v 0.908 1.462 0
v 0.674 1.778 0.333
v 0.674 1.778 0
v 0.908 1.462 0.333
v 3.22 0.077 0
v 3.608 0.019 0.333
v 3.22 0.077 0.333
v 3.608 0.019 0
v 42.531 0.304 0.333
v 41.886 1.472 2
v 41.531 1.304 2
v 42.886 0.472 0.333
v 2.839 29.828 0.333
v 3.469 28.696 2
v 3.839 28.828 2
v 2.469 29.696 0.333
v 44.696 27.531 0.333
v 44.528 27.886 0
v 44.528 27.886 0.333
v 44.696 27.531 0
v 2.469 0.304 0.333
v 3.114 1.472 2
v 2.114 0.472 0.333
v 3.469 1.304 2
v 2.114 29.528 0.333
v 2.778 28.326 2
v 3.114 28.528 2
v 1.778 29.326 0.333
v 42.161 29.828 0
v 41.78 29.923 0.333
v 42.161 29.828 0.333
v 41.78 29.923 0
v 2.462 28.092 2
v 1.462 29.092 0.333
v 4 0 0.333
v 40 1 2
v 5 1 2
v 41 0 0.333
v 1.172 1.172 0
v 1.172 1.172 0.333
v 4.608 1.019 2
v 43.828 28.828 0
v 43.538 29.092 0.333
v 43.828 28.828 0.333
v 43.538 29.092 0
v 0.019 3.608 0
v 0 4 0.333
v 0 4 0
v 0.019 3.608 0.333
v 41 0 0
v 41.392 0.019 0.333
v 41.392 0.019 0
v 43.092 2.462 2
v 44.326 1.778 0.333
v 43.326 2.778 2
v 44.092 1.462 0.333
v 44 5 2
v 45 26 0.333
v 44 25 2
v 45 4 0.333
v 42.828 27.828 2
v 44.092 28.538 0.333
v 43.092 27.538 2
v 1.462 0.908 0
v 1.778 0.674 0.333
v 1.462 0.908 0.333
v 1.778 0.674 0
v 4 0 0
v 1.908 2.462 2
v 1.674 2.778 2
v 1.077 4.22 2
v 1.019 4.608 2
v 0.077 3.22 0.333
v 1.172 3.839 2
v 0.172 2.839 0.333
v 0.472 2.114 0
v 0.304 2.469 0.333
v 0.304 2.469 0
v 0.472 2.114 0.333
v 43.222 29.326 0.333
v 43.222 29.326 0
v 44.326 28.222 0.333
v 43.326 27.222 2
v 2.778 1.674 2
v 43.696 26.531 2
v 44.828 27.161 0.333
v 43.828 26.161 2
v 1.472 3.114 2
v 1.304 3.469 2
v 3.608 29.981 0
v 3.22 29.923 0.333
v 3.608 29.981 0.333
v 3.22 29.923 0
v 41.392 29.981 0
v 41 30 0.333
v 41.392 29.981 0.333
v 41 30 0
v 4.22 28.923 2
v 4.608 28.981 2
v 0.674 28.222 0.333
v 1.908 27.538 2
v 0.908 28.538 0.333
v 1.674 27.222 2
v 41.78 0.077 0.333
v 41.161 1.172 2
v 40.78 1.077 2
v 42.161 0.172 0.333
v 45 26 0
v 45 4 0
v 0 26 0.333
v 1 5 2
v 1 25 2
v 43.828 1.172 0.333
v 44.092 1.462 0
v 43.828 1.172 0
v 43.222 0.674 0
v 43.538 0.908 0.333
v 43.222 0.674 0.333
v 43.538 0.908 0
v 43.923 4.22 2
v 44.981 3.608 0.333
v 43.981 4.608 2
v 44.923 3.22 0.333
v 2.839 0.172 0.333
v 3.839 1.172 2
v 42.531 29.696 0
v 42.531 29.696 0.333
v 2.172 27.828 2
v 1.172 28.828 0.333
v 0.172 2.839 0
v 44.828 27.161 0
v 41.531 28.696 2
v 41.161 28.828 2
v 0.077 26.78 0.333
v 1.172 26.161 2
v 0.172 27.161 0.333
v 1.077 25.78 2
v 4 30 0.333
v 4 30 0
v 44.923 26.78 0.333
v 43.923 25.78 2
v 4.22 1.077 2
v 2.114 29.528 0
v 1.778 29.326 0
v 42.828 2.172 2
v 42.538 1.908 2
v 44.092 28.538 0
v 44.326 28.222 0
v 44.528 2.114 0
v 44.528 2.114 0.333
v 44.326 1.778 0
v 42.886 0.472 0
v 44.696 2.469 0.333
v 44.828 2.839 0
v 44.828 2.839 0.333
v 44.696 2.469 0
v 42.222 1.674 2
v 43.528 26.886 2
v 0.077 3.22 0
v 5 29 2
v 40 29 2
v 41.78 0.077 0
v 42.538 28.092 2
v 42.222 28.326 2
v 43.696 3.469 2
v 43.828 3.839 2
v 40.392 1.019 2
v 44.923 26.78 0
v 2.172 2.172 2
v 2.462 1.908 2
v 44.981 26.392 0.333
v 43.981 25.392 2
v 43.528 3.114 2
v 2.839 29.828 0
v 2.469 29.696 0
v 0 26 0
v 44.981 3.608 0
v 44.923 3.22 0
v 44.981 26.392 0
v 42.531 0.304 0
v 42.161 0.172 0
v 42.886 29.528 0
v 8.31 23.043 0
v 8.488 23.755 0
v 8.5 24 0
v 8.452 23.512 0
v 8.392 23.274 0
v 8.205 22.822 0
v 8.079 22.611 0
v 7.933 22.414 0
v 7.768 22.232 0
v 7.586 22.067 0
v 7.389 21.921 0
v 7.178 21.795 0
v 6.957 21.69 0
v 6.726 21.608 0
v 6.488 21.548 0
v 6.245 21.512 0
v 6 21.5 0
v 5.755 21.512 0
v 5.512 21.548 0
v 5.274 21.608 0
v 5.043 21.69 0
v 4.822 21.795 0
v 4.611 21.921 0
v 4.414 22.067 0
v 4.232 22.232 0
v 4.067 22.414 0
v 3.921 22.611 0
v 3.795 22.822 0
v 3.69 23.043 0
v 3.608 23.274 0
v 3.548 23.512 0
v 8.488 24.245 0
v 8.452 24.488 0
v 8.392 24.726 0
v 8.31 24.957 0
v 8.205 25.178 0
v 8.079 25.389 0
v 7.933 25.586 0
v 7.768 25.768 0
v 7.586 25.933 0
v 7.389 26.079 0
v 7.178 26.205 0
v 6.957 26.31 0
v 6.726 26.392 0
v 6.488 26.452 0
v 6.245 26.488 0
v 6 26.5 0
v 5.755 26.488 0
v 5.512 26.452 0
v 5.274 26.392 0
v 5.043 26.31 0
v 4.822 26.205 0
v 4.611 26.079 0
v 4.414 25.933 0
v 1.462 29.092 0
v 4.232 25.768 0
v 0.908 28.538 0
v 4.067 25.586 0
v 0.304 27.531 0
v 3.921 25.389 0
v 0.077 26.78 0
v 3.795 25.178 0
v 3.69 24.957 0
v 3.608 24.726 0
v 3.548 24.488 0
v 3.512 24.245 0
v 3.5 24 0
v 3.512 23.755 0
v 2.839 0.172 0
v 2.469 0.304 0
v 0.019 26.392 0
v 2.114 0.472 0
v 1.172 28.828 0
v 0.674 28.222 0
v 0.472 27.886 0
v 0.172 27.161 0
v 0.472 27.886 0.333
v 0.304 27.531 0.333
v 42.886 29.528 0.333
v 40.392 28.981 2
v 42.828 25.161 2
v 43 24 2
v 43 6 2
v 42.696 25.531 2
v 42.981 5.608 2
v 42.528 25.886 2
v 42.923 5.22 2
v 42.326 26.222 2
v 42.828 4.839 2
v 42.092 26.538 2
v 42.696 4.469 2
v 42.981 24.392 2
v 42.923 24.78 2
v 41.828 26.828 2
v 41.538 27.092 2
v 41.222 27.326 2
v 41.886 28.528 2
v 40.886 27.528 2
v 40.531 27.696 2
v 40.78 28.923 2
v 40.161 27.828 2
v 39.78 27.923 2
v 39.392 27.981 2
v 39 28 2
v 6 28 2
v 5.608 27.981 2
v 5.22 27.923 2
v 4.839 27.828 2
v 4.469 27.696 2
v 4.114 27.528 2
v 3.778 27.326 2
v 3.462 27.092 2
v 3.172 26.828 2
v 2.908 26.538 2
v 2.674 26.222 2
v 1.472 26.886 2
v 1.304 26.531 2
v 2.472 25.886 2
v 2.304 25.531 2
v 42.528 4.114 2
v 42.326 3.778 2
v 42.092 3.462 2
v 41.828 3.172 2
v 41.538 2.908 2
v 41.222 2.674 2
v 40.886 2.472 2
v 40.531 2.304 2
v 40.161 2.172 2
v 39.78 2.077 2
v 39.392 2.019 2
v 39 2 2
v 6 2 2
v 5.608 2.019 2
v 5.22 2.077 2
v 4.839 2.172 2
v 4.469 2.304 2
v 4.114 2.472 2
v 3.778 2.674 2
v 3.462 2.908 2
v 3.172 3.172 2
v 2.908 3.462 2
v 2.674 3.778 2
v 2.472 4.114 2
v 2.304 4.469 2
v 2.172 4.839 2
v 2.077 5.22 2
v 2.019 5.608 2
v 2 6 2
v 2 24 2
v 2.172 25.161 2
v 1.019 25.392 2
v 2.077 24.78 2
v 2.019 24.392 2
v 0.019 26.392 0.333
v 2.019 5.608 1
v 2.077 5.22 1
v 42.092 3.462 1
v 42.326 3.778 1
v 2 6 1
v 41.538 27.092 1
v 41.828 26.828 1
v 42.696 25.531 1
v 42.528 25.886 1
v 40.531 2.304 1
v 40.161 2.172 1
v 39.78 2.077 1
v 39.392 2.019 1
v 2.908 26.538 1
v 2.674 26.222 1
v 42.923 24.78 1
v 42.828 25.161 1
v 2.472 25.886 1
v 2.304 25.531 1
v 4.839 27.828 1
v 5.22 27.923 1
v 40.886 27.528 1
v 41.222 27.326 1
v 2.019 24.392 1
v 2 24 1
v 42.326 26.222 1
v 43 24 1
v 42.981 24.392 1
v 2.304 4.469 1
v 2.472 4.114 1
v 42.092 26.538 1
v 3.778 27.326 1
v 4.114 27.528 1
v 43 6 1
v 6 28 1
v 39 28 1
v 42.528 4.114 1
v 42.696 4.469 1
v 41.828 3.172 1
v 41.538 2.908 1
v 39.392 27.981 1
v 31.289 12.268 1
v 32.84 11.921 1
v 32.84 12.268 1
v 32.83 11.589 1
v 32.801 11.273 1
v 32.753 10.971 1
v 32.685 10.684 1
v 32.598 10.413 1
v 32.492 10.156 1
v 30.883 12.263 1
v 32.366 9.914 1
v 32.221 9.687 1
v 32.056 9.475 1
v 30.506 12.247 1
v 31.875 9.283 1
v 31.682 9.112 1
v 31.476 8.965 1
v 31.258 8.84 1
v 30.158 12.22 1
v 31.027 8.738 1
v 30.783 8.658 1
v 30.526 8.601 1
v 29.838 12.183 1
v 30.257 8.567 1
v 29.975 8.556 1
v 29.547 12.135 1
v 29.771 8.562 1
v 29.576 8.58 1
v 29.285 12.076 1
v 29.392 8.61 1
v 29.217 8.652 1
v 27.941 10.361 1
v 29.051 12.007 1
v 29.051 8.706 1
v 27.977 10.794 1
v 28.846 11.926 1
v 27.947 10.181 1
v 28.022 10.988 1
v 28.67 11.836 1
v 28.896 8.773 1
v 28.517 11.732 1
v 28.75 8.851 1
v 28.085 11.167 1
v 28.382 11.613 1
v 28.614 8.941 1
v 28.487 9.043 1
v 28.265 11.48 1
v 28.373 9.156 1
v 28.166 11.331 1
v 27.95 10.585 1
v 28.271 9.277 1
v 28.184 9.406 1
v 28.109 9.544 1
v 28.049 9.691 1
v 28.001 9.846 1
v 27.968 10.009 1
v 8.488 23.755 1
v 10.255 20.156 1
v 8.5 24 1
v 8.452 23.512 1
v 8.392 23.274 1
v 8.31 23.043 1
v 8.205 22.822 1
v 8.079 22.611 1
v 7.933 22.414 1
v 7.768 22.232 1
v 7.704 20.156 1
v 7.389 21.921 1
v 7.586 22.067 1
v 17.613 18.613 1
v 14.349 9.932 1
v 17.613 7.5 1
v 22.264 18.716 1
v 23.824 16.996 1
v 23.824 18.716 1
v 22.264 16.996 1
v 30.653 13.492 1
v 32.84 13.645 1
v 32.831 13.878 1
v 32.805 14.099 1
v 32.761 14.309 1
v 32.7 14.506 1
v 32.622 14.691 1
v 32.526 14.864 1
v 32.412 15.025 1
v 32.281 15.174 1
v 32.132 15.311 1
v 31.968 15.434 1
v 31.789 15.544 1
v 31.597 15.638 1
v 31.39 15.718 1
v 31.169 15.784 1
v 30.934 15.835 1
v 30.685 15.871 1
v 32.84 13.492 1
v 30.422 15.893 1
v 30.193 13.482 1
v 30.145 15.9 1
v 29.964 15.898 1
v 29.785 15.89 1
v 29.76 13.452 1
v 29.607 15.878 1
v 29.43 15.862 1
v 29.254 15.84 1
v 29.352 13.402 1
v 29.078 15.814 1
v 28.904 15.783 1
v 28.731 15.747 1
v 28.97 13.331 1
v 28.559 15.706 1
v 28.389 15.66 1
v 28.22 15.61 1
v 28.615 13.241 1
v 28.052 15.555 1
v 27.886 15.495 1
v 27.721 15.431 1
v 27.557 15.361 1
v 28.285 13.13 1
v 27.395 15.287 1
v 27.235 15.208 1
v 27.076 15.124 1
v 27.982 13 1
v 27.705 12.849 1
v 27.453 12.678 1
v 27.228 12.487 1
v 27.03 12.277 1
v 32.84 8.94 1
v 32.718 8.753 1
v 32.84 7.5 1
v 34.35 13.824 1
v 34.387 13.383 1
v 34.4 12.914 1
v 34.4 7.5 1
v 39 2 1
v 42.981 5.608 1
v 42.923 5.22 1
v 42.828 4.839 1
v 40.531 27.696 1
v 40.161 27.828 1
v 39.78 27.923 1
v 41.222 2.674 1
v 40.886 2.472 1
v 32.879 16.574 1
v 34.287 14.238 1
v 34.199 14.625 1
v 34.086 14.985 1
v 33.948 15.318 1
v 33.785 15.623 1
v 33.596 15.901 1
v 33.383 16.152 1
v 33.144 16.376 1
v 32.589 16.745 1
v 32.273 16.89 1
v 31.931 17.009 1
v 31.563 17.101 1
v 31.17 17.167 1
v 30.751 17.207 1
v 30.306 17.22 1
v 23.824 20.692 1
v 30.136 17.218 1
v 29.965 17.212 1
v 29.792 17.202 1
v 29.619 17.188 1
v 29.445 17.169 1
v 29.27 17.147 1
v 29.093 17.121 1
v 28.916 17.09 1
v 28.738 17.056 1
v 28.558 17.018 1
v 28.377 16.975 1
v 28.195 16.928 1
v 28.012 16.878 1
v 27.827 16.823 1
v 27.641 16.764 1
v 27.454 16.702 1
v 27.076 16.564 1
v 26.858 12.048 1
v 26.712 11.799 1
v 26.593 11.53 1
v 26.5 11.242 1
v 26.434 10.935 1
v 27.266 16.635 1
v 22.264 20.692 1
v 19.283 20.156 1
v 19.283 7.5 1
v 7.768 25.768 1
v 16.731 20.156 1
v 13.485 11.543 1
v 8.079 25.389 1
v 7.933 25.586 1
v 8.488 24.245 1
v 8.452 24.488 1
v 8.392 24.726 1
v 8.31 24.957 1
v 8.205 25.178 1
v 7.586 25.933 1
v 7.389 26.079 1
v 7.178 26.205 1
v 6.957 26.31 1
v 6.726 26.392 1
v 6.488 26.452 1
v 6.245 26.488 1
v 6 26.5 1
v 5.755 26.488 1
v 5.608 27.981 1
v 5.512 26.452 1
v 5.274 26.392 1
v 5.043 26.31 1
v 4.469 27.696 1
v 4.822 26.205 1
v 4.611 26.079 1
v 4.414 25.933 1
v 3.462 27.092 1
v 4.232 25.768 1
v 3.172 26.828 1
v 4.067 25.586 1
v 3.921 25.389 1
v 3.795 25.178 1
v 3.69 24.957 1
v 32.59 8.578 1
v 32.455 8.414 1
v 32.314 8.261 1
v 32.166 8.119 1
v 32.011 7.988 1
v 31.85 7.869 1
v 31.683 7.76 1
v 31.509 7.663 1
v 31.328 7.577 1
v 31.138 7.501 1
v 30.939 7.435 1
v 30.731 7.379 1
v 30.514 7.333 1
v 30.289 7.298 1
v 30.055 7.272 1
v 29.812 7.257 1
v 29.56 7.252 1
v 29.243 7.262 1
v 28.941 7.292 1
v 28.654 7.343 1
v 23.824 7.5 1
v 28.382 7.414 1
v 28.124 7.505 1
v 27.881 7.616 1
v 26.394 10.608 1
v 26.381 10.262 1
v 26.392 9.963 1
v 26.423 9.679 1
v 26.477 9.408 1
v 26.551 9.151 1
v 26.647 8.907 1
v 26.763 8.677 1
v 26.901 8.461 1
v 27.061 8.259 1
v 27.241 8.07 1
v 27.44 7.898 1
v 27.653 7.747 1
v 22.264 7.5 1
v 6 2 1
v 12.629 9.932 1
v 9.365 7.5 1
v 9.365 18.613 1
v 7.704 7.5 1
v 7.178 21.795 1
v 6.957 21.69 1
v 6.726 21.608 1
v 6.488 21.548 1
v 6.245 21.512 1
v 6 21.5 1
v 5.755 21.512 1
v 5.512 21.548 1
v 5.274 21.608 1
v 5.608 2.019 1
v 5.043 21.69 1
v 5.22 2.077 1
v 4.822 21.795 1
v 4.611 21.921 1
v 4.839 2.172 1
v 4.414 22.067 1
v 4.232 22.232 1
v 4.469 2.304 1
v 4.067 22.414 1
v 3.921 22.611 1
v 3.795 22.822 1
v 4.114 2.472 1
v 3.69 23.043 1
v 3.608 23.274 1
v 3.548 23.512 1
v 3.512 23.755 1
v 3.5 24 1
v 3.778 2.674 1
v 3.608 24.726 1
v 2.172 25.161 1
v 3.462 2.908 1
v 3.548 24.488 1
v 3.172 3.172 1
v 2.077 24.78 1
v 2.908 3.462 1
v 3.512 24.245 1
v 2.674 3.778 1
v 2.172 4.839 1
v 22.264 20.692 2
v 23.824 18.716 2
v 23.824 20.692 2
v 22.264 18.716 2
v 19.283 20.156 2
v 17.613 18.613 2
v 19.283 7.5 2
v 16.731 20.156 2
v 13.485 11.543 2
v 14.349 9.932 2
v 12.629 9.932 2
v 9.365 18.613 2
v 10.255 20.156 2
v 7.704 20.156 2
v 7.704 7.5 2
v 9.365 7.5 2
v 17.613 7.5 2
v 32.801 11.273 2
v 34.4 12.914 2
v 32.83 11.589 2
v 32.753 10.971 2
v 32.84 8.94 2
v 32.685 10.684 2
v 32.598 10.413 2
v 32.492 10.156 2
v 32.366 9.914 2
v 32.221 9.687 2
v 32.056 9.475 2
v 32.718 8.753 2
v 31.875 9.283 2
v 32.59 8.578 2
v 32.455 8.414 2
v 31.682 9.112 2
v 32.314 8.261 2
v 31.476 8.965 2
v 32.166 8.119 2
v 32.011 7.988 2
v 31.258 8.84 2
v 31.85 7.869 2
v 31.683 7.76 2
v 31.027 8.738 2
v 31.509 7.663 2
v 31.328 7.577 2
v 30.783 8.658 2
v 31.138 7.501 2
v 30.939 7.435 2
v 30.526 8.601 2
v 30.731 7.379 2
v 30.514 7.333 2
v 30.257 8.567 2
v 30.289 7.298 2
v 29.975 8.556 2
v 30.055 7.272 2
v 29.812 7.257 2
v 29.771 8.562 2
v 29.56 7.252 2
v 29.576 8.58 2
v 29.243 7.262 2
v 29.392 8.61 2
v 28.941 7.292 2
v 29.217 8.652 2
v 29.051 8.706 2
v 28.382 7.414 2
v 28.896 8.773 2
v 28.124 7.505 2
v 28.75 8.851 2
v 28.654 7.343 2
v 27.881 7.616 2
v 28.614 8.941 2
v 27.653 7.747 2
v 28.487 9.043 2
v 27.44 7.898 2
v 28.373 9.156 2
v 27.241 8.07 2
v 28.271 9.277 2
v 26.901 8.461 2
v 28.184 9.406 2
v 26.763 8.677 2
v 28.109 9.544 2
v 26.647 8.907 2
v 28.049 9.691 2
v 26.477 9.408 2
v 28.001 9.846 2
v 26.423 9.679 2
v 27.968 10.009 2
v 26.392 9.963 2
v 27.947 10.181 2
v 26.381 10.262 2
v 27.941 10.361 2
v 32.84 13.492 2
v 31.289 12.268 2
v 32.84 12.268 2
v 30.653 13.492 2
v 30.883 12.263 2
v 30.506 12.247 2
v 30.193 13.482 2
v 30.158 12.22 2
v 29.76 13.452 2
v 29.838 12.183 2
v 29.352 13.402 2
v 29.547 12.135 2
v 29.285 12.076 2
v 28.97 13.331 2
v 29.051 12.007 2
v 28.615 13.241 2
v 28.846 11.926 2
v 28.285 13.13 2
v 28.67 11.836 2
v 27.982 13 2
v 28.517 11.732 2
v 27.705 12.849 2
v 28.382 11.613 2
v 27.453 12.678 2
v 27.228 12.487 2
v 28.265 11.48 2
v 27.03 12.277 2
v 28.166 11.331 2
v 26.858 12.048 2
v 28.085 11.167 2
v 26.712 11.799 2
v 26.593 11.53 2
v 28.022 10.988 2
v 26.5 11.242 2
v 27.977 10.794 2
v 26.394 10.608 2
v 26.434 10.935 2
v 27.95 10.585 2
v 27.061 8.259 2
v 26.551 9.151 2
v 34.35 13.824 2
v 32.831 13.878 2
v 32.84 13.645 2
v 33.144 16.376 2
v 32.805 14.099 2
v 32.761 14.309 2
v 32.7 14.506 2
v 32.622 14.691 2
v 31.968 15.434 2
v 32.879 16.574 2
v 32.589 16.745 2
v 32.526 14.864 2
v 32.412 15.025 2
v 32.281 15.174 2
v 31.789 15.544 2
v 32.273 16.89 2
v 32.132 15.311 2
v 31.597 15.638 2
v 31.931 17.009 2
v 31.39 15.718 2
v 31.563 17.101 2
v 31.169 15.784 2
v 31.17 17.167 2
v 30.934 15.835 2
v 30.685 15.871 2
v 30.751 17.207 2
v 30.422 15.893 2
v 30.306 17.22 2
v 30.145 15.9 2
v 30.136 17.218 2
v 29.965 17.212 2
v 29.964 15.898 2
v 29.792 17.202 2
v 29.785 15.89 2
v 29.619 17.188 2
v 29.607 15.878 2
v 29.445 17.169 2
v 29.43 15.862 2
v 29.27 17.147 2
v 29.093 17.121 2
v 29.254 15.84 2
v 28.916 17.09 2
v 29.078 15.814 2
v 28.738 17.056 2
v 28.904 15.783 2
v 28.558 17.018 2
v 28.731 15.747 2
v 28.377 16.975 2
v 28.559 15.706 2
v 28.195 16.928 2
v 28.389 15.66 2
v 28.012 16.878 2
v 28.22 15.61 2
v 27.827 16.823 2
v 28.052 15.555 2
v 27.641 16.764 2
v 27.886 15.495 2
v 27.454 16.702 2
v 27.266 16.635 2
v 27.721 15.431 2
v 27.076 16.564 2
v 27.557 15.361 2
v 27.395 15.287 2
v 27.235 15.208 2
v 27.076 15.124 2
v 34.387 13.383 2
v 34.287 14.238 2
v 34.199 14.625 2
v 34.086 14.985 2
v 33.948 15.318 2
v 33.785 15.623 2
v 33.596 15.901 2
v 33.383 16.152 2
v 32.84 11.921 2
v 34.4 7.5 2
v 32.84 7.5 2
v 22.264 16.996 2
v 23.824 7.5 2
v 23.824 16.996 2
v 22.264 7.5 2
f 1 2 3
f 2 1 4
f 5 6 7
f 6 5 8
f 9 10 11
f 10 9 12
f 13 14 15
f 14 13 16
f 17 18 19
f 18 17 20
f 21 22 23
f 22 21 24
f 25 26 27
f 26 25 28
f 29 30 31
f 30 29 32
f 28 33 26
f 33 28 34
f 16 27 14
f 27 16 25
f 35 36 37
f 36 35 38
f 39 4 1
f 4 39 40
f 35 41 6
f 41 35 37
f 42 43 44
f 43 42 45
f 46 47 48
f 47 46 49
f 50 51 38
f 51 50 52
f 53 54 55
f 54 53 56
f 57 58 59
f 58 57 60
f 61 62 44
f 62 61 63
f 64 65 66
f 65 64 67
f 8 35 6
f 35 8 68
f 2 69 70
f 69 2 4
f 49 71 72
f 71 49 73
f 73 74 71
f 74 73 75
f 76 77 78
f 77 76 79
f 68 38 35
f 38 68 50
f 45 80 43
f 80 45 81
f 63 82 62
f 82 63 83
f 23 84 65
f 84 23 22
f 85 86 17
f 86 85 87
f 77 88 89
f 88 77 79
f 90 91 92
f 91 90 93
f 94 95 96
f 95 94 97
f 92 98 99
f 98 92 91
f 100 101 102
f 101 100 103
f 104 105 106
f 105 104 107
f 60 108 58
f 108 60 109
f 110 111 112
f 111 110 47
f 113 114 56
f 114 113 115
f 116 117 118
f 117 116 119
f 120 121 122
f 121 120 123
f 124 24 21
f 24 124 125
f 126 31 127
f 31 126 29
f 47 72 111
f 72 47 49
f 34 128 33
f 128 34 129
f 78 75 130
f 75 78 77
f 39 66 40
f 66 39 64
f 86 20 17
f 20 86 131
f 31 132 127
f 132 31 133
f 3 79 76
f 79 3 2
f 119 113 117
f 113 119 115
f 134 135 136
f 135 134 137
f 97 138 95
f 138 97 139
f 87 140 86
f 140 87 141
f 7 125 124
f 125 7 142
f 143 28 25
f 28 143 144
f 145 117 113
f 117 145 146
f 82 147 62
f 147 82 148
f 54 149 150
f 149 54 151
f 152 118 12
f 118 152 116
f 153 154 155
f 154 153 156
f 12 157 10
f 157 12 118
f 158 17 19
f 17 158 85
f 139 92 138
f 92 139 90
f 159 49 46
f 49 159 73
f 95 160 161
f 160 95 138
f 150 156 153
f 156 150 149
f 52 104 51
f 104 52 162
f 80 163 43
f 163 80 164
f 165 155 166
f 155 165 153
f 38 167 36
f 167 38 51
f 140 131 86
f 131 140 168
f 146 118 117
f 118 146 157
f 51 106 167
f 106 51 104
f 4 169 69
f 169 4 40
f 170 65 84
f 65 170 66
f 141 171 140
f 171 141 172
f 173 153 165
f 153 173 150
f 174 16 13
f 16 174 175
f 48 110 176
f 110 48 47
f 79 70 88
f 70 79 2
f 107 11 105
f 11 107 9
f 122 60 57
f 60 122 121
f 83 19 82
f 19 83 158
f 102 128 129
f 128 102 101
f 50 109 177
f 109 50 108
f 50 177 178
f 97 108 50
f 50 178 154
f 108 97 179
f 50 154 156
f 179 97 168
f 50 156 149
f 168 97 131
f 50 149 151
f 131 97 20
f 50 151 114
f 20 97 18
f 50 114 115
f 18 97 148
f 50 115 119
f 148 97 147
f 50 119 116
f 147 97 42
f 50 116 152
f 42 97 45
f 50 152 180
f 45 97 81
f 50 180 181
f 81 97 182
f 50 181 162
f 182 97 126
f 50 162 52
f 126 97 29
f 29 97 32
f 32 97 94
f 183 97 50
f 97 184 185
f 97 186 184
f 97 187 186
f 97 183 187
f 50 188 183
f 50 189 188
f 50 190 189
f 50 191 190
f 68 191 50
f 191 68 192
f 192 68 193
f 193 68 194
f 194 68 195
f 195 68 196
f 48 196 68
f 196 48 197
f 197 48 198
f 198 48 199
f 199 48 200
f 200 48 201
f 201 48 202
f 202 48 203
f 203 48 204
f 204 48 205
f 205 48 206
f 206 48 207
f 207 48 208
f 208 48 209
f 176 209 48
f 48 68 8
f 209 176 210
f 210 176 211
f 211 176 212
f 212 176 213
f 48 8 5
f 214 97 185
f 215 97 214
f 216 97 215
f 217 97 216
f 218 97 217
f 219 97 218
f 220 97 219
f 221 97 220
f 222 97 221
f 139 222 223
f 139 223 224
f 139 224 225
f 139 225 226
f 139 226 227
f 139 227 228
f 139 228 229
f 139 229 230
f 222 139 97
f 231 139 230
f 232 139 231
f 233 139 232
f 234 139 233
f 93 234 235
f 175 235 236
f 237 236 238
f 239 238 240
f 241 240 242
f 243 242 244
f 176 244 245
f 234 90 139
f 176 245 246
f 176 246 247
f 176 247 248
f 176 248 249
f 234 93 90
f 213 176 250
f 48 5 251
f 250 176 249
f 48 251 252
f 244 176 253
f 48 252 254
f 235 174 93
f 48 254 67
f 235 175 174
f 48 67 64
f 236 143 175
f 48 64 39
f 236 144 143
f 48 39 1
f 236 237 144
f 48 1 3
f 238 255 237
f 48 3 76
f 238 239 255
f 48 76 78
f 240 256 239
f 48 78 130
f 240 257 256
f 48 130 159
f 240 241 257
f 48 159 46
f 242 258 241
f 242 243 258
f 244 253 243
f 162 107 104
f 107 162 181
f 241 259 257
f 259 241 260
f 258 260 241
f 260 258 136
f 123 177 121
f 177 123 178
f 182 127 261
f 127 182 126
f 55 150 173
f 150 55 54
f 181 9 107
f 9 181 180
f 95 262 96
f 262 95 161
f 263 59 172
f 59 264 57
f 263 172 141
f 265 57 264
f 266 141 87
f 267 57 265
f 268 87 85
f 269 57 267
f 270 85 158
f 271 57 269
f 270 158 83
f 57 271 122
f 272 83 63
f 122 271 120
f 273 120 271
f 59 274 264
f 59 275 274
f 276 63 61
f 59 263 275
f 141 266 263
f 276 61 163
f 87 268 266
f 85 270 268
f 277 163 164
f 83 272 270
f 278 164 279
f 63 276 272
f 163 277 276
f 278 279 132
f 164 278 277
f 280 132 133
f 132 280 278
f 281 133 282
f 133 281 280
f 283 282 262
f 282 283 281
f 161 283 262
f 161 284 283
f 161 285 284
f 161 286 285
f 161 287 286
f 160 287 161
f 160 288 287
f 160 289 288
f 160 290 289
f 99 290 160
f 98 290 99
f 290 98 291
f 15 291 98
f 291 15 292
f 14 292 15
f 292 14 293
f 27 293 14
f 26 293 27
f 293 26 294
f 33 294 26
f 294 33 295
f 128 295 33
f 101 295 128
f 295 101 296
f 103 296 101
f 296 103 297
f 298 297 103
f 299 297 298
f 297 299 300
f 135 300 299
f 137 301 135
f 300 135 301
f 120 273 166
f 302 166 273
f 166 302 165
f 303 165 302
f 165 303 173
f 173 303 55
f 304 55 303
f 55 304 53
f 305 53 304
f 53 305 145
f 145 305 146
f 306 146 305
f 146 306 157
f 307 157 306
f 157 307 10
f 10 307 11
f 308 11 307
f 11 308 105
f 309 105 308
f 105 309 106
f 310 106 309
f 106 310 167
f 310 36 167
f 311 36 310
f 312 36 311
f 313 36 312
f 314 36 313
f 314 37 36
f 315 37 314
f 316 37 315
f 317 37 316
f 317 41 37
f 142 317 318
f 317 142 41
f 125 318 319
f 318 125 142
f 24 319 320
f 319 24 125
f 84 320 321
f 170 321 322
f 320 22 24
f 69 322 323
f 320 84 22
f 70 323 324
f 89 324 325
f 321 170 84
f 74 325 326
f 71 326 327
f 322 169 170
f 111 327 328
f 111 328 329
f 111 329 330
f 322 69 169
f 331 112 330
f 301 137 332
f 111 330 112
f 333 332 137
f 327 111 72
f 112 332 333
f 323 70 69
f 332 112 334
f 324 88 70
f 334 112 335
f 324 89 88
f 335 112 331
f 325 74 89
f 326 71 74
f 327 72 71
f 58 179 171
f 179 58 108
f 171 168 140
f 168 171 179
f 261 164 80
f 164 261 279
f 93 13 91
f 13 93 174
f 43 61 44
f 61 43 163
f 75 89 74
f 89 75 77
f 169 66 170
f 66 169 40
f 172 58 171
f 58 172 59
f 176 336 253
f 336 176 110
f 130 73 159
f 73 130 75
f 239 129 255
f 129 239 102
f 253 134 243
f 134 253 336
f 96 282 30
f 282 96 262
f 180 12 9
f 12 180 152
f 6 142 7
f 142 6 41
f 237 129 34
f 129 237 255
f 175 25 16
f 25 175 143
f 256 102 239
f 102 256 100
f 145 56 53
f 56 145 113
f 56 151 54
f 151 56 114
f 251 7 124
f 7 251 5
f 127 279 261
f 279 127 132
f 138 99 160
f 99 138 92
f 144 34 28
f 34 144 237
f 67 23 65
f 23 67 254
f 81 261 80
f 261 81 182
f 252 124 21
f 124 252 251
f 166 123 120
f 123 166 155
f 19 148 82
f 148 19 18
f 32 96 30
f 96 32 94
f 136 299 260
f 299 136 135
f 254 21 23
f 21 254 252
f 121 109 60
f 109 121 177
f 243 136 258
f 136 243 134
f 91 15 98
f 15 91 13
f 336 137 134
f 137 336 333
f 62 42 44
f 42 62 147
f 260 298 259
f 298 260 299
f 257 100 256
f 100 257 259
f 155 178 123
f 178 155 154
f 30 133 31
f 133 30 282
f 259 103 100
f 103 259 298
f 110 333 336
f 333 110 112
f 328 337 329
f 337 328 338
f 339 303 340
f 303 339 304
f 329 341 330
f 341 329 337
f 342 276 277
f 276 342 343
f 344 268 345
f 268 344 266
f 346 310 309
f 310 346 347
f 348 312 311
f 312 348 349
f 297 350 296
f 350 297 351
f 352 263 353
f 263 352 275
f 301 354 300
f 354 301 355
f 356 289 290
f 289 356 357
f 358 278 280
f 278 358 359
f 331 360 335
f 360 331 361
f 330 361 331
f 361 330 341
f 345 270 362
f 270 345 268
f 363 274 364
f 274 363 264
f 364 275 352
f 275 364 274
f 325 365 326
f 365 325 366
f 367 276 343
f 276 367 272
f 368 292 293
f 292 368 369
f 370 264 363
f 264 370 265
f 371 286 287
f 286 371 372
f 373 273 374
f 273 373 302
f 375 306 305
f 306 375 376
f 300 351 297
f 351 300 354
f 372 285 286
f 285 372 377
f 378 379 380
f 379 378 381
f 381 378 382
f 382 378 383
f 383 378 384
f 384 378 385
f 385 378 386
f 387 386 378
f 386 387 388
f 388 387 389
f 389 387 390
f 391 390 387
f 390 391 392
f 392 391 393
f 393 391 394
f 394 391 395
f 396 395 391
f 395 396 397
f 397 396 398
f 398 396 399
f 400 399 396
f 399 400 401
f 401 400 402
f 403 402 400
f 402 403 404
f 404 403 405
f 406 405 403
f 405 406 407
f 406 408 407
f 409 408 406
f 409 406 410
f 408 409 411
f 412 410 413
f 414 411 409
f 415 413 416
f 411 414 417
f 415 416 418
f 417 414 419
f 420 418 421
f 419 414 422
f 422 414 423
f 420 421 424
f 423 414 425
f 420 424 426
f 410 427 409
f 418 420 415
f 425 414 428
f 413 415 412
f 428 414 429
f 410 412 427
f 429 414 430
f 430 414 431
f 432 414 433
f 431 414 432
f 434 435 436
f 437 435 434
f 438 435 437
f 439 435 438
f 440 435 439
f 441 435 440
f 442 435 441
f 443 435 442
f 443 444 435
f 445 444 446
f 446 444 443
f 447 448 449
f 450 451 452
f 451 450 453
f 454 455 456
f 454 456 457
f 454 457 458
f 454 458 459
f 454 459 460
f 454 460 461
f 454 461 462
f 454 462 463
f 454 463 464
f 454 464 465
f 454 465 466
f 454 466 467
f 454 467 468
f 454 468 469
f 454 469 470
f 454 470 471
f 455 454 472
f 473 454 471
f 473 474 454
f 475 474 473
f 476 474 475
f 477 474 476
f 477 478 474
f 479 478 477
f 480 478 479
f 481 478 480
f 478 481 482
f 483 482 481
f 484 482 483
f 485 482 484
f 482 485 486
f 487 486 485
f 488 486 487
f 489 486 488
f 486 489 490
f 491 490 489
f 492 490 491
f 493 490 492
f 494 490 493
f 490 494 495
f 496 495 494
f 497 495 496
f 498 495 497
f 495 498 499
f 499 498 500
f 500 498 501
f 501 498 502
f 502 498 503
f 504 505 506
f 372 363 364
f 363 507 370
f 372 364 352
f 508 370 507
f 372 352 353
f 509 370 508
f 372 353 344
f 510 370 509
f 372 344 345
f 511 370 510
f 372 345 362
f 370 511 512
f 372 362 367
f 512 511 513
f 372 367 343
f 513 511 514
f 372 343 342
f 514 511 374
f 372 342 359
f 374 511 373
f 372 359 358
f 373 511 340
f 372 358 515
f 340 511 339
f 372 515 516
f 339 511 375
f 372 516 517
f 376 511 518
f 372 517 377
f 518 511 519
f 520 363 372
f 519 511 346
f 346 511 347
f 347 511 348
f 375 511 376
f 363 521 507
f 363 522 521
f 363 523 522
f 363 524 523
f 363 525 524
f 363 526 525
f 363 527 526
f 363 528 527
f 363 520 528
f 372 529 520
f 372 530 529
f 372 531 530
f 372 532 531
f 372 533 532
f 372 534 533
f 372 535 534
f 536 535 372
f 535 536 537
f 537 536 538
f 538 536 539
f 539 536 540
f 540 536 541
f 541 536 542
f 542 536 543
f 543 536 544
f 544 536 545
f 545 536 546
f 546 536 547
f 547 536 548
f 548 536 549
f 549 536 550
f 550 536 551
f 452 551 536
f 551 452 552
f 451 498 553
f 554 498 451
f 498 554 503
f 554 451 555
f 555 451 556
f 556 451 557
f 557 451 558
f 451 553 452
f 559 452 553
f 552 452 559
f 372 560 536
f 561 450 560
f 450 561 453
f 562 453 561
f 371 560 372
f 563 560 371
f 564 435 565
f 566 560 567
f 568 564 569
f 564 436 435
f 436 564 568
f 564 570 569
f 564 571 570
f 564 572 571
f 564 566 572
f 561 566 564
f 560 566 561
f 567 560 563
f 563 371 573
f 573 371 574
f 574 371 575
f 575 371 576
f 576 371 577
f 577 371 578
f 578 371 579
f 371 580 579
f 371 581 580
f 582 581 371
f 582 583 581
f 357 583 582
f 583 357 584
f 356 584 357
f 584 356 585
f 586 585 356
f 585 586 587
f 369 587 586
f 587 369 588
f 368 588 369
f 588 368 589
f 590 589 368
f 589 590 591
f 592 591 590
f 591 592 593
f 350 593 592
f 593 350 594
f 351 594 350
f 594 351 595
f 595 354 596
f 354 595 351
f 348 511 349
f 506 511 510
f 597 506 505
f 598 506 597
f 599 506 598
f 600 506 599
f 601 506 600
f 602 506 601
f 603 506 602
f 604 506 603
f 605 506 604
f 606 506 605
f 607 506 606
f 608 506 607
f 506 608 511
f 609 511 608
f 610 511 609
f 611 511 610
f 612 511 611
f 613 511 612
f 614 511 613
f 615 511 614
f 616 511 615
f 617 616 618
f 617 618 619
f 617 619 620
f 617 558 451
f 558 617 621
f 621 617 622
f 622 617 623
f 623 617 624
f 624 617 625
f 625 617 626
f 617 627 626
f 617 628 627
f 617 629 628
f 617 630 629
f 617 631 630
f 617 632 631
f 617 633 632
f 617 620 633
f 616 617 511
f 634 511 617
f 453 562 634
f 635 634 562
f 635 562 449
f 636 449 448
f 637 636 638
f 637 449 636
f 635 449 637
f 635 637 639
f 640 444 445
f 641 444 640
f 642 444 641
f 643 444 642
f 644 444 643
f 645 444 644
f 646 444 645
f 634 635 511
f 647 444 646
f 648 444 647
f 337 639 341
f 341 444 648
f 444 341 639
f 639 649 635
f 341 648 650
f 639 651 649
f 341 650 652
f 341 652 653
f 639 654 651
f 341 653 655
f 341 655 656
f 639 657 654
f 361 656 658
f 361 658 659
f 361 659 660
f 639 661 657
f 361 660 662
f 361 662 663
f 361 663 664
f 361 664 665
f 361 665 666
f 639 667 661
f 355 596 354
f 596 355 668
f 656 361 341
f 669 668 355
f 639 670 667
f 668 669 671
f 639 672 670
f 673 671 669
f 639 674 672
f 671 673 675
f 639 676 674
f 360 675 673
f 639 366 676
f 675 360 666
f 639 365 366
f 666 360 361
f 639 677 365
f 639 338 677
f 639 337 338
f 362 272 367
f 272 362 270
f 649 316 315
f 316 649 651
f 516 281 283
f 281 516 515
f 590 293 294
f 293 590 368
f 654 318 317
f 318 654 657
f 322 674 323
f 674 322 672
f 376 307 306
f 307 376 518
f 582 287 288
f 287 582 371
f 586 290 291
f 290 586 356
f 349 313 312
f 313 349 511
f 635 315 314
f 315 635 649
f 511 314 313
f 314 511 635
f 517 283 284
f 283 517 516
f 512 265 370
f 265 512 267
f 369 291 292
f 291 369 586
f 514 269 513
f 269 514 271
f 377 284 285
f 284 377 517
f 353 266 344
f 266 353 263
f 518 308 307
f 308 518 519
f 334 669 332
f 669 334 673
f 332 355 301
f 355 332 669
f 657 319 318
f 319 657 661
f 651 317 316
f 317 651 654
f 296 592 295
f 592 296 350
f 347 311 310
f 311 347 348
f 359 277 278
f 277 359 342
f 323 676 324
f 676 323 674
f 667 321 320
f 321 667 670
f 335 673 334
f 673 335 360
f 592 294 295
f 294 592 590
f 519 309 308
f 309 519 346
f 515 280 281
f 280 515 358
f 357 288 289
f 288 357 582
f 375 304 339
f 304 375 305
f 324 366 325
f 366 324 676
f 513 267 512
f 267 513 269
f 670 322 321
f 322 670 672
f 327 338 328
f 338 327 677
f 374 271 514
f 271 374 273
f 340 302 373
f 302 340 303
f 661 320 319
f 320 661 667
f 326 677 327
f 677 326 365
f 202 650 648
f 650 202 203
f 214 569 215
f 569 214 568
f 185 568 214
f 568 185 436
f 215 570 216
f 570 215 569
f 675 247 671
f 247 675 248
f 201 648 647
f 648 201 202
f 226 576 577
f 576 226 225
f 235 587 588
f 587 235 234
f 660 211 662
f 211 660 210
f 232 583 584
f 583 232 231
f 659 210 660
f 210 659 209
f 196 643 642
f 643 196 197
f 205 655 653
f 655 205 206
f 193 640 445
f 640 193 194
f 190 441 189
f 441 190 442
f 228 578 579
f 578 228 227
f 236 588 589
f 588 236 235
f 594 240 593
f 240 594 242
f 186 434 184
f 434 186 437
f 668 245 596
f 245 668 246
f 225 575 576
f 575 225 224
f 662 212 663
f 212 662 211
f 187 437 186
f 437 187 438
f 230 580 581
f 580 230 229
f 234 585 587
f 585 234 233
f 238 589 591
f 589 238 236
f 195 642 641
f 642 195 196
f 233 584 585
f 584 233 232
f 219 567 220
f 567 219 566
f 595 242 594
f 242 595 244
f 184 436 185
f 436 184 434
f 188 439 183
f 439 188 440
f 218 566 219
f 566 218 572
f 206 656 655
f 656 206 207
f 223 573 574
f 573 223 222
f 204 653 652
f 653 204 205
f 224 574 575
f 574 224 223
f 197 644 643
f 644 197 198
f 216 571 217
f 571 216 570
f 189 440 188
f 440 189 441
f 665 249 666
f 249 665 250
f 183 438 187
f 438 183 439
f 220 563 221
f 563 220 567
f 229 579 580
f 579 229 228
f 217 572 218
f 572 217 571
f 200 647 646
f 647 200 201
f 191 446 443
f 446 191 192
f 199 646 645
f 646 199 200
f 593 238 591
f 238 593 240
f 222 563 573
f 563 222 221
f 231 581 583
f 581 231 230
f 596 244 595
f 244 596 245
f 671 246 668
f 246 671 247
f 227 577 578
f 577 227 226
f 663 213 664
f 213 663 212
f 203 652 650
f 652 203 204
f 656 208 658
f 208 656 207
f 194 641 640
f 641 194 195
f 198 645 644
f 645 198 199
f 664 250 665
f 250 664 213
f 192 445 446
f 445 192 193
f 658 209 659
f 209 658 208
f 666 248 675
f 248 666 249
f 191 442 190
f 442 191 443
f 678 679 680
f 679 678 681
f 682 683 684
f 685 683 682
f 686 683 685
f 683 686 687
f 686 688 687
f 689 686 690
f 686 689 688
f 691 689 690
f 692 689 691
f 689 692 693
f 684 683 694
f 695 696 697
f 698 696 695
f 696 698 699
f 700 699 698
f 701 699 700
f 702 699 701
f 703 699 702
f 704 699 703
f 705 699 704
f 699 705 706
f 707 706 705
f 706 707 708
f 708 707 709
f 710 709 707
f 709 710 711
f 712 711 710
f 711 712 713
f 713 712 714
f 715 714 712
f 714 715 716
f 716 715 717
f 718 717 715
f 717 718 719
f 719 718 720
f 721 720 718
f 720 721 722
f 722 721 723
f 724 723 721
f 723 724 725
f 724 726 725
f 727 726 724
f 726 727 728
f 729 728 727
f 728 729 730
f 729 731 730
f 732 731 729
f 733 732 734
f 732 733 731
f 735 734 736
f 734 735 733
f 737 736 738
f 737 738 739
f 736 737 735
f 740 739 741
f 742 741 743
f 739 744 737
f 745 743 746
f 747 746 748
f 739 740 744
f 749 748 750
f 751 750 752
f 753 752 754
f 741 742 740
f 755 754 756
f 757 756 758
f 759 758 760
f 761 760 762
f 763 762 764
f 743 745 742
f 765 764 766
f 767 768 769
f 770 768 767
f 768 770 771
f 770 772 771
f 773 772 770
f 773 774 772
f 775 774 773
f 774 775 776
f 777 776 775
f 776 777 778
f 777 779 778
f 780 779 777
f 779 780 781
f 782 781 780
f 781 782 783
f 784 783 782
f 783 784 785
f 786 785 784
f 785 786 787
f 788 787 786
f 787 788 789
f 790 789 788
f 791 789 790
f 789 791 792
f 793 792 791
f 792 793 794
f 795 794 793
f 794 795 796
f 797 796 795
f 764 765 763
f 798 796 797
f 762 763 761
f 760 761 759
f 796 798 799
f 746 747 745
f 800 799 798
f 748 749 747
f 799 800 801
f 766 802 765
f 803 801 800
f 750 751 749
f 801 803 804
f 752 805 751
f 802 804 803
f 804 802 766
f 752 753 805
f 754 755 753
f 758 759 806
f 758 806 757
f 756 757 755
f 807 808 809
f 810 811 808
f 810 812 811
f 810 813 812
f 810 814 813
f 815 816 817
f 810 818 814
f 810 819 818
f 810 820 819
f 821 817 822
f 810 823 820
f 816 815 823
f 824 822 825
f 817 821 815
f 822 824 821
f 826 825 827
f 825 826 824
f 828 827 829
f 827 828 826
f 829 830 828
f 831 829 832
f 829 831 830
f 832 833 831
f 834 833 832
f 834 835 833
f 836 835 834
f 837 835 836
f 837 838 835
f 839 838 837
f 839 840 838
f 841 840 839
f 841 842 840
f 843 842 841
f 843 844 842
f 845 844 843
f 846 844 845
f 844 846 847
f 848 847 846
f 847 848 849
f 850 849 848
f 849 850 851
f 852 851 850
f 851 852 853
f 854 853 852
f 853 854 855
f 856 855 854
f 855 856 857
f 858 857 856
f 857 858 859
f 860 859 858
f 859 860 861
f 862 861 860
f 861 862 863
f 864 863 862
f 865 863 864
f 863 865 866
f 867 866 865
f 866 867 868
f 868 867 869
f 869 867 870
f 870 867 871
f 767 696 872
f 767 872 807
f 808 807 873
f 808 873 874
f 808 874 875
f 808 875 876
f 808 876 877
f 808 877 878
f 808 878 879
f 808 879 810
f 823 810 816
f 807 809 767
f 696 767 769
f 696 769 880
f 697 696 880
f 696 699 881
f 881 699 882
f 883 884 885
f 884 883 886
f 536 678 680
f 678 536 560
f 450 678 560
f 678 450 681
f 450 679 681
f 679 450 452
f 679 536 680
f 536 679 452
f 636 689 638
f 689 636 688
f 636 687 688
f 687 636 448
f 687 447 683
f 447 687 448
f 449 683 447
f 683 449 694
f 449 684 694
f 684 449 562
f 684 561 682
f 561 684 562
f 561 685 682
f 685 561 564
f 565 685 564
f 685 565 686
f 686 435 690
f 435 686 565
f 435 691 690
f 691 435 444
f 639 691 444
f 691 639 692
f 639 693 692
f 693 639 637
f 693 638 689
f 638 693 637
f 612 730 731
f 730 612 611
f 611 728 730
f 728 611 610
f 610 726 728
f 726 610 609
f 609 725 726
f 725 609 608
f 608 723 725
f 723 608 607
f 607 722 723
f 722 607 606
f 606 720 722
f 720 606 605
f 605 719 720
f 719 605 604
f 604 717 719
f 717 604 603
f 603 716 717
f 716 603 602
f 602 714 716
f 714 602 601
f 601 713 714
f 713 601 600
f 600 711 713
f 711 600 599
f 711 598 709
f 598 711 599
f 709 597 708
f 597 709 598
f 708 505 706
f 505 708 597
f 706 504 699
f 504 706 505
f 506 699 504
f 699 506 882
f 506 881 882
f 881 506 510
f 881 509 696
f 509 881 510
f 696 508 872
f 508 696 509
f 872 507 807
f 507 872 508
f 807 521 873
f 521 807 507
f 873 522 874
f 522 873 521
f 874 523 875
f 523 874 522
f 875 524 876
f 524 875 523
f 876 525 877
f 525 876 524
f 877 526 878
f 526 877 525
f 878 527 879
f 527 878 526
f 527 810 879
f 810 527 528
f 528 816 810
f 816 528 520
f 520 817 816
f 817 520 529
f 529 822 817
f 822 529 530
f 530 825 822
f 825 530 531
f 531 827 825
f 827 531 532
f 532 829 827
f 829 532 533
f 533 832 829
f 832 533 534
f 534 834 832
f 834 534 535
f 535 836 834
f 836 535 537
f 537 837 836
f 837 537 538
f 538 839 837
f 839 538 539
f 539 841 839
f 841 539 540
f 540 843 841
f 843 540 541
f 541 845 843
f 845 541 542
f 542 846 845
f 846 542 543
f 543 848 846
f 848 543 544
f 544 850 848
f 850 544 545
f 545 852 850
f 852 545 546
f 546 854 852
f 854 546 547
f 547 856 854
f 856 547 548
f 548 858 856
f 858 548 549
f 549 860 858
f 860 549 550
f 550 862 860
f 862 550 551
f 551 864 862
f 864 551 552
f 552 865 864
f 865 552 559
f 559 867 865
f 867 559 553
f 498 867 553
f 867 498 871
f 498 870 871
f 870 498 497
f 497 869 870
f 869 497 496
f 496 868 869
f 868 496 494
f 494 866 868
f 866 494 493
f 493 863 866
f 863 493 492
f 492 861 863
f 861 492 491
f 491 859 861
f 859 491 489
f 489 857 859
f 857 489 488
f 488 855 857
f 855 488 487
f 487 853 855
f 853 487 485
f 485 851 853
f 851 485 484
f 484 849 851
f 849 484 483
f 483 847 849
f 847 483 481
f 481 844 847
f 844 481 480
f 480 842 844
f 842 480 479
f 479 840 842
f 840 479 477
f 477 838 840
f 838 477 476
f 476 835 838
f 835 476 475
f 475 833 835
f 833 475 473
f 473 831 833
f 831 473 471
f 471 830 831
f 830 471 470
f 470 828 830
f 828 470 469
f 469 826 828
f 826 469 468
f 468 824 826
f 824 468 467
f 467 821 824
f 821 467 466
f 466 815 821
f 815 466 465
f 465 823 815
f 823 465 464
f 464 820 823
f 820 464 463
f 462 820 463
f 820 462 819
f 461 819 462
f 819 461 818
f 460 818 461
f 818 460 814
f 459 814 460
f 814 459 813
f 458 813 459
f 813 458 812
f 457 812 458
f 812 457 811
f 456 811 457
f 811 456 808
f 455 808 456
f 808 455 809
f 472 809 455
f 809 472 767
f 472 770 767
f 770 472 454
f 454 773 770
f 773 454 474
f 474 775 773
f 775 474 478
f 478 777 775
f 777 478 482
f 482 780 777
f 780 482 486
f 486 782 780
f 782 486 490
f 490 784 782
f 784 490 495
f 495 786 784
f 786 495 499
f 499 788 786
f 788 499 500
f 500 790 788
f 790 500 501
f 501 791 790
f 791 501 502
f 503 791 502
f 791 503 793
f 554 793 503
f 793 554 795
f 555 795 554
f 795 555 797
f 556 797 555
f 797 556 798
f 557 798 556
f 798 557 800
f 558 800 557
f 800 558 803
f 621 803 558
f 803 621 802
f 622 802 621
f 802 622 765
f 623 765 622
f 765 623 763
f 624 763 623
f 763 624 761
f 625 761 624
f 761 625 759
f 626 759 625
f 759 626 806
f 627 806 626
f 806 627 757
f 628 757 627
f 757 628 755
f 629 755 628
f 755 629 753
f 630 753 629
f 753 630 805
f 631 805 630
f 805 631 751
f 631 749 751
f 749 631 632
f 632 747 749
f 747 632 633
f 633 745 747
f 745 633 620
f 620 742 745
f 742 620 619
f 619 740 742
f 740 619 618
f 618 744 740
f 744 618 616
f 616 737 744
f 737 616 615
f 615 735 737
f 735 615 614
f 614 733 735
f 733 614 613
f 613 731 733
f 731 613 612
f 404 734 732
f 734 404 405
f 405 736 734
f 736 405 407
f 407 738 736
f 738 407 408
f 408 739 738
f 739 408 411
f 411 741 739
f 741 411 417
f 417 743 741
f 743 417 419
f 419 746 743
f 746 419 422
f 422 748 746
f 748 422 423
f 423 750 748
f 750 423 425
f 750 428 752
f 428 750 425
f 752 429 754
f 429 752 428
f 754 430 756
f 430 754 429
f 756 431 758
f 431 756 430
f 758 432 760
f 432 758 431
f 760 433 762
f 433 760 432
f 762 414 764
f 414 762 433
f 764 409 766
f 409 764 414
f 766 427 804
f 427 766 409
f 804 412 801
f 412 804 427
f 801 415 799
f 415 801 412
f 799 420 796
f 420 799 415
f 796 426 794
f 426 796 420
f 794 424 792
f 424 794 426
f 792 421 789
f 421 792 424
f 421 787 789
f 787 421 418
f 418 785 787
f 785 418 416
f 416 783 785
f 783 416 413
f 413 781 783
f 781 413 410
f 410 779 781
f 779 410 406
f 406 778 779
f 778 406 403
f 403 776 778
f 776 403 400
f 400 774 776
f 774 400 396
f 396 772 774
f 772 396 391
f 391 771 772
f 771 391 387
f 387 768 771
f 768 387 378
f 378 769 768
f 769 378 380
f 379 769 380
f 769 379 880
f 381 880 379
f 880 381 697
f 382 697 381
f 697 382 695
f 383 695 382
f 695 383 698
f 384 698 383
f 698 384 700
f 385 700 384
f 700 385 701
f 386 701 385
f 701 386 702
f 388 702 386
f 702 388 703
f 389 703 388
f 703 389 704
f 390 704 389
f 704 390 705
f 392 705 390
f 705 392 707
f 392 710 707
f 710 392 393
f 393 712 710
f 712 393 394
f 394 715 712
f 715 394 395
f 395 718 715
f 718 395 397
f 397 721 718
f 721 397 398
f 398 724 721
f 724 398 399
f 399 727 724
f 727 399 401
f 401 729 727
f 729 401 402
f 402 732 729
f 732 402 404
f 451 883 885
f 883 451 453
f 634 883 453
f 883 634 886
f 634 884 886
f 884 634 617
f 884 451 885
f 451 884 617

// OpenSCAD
// file: ymse.scad
// vim:ts=4:sw=4:sts=4:et:ai

/*
 * avrundaboks() takes the following arguments
 *
 * x: width
 * y: depth
 * z: height
 * r: radius of corner
 *
 */
module avrundaboks(x,y,z,r) {
    hull() {
        translate([r,r,0])
            cylinder(h=z,r=r);
        translate([x-r,r,0])
            cylinder(h=z,r=r);
        translate([r,y-r,0])
            cylinder(h=z,r=r);
        translate([x-r,y-r,0])
            cylinder(h=z,r=r);
    }
}

/*
 * avrundahulboks() takes the same arguments as avrundaboks() plus the following:
 *
 * v: wall thickness
 * g: floor thickness
 *
 */
module avrundahulboks(x,y,z,r,v,g) {
    difference() {
        avrundaboks(x,y,z,r);
        translate([v,v,g])
            avrundaboks(x-v*2,y-v*2,z-g,r);
    }
}


/*
 * hexagon(), a single filled hexagon, takes the following arguments:
 *
 * l: The diameter
 */ 
module hexagon(l)  {
	circle(d=l, $fn=6);
}

/*
 * honeycomb() takes the following arguments:
 *
 * x: width
 * y: height/depth
 * dia: the hexacon's diameters (that is, circles with six parts, do the math)
 * wall: wall thickness.
 *
 * Diagram
 *          ______     ___
 *         /     /\     |
 *        / dia /  \    | smallDia
 *       /     /    \  _|_
 *       \          /   ____ 
 *        \        /   / 
 *     ___ \______/   / 
 * wall |            /
 *     _|_  ______   \
 *         /      \   \
 *        /        \   \
 *                 |---|
 *                   projWall
 *
 */
module honeycomb(x, y, dia, wall)  {
	smallDia = dia * cos(30);
	projWall = wall * cos(30);

	yStep = smallDia + wall;
	xStep = dia*3/2 + projWall*2;

	difference()  {
		square([x, y]);

		// Note, number of step+1 to ensure the whole surface is covered
		for (yOffset = [0:yStep:y+yStep], xOffset = [0:xStep:x+xStep]) {
			translate([xOffset, yOffset]) {
				hexagon(dia);
			}
			translate([xOffset + dia*3/4 + projWall, yOffset + (smallDia+wall)/2]) {
				hexagon(dia);
			}
		}
	}
}

/*
 * Where OpenSCAD comes with union(), difference() and intersection(),
 * respectively translating to OR, AND NOT/NOT AND and AND, it lacks XOR. This
 * is an implementation of it, combining intersection_for() and difference().
 *
 * xor() eats no arguments, only children
 *
 */
module xor() {
    difference() {
        for(i = [0 : $children - 1])
            children(i);
        intersection_for(i = [0: $children -1])
            children(i);
    }                                                                
}
// main file
// Pakkelapp

use <ymse.scad>


$fn = $preview ? 8 : 64;

xsize = 45;
ysize = 30;
corner_rounding = 4;
line = 1;
hole_radius = 2.5;
label_thickness = 1;
text_thickness = 1;
fontsize=12.5;
fonttype="Apple Chancery:style=筆寫斜體";
//fonttype="Liberation Sans";
fontspacing=1;
bugaddition = $preview ? 0.1 : 0;

name = "Mia";

// avrunda firkant
module roundedsquare(size, radius) {
    hull() {
        translate([radius, radius]) circle(r=radius);
        translate([size[0]-radius, radius]) circle(r=radius);
        translate([radius, size[1]-radius]) circle(r=radius);
        translate([size[0]-radius, size[1]-radius]) circle(r=radius);
    }
}

// Selve merket
difference() {
    hull() {
        linear_extrude(label_thickness/3) {
            roundedsquare([xsize,ysize], corner_rounding);
        }
        translate([label_thickness,label_thickness,label_thickness/3]) {
            linear_extrude(label_thickness/3*5) {
                roundedsquare([xsize-label_thickness*2,ysize-label_thickness*2], corner_rounding);
            }   
        }
    }
    translate([label_thickness+line,label_thickness+line,label_thickness])
        linear_extrude(label_thickness+bugaddition)
            roundedsquare([xsize-label_thickness*2-line*2,ysize-label_thickness*2-line*2], corner_rounding);
    translate([corner_rounding*1.5,ysize-corner_rounding*1.5,-bugaddition]) {
        cylinder(r=hole_radius,h=label_thickness+bugaddition*2);
    }
}

// Og teksten
translate([6,ysize/4,label_thickness]) {
    linear_extrude(text_thickness)
        text(name, size=fontsize, font=fonttype);
}
